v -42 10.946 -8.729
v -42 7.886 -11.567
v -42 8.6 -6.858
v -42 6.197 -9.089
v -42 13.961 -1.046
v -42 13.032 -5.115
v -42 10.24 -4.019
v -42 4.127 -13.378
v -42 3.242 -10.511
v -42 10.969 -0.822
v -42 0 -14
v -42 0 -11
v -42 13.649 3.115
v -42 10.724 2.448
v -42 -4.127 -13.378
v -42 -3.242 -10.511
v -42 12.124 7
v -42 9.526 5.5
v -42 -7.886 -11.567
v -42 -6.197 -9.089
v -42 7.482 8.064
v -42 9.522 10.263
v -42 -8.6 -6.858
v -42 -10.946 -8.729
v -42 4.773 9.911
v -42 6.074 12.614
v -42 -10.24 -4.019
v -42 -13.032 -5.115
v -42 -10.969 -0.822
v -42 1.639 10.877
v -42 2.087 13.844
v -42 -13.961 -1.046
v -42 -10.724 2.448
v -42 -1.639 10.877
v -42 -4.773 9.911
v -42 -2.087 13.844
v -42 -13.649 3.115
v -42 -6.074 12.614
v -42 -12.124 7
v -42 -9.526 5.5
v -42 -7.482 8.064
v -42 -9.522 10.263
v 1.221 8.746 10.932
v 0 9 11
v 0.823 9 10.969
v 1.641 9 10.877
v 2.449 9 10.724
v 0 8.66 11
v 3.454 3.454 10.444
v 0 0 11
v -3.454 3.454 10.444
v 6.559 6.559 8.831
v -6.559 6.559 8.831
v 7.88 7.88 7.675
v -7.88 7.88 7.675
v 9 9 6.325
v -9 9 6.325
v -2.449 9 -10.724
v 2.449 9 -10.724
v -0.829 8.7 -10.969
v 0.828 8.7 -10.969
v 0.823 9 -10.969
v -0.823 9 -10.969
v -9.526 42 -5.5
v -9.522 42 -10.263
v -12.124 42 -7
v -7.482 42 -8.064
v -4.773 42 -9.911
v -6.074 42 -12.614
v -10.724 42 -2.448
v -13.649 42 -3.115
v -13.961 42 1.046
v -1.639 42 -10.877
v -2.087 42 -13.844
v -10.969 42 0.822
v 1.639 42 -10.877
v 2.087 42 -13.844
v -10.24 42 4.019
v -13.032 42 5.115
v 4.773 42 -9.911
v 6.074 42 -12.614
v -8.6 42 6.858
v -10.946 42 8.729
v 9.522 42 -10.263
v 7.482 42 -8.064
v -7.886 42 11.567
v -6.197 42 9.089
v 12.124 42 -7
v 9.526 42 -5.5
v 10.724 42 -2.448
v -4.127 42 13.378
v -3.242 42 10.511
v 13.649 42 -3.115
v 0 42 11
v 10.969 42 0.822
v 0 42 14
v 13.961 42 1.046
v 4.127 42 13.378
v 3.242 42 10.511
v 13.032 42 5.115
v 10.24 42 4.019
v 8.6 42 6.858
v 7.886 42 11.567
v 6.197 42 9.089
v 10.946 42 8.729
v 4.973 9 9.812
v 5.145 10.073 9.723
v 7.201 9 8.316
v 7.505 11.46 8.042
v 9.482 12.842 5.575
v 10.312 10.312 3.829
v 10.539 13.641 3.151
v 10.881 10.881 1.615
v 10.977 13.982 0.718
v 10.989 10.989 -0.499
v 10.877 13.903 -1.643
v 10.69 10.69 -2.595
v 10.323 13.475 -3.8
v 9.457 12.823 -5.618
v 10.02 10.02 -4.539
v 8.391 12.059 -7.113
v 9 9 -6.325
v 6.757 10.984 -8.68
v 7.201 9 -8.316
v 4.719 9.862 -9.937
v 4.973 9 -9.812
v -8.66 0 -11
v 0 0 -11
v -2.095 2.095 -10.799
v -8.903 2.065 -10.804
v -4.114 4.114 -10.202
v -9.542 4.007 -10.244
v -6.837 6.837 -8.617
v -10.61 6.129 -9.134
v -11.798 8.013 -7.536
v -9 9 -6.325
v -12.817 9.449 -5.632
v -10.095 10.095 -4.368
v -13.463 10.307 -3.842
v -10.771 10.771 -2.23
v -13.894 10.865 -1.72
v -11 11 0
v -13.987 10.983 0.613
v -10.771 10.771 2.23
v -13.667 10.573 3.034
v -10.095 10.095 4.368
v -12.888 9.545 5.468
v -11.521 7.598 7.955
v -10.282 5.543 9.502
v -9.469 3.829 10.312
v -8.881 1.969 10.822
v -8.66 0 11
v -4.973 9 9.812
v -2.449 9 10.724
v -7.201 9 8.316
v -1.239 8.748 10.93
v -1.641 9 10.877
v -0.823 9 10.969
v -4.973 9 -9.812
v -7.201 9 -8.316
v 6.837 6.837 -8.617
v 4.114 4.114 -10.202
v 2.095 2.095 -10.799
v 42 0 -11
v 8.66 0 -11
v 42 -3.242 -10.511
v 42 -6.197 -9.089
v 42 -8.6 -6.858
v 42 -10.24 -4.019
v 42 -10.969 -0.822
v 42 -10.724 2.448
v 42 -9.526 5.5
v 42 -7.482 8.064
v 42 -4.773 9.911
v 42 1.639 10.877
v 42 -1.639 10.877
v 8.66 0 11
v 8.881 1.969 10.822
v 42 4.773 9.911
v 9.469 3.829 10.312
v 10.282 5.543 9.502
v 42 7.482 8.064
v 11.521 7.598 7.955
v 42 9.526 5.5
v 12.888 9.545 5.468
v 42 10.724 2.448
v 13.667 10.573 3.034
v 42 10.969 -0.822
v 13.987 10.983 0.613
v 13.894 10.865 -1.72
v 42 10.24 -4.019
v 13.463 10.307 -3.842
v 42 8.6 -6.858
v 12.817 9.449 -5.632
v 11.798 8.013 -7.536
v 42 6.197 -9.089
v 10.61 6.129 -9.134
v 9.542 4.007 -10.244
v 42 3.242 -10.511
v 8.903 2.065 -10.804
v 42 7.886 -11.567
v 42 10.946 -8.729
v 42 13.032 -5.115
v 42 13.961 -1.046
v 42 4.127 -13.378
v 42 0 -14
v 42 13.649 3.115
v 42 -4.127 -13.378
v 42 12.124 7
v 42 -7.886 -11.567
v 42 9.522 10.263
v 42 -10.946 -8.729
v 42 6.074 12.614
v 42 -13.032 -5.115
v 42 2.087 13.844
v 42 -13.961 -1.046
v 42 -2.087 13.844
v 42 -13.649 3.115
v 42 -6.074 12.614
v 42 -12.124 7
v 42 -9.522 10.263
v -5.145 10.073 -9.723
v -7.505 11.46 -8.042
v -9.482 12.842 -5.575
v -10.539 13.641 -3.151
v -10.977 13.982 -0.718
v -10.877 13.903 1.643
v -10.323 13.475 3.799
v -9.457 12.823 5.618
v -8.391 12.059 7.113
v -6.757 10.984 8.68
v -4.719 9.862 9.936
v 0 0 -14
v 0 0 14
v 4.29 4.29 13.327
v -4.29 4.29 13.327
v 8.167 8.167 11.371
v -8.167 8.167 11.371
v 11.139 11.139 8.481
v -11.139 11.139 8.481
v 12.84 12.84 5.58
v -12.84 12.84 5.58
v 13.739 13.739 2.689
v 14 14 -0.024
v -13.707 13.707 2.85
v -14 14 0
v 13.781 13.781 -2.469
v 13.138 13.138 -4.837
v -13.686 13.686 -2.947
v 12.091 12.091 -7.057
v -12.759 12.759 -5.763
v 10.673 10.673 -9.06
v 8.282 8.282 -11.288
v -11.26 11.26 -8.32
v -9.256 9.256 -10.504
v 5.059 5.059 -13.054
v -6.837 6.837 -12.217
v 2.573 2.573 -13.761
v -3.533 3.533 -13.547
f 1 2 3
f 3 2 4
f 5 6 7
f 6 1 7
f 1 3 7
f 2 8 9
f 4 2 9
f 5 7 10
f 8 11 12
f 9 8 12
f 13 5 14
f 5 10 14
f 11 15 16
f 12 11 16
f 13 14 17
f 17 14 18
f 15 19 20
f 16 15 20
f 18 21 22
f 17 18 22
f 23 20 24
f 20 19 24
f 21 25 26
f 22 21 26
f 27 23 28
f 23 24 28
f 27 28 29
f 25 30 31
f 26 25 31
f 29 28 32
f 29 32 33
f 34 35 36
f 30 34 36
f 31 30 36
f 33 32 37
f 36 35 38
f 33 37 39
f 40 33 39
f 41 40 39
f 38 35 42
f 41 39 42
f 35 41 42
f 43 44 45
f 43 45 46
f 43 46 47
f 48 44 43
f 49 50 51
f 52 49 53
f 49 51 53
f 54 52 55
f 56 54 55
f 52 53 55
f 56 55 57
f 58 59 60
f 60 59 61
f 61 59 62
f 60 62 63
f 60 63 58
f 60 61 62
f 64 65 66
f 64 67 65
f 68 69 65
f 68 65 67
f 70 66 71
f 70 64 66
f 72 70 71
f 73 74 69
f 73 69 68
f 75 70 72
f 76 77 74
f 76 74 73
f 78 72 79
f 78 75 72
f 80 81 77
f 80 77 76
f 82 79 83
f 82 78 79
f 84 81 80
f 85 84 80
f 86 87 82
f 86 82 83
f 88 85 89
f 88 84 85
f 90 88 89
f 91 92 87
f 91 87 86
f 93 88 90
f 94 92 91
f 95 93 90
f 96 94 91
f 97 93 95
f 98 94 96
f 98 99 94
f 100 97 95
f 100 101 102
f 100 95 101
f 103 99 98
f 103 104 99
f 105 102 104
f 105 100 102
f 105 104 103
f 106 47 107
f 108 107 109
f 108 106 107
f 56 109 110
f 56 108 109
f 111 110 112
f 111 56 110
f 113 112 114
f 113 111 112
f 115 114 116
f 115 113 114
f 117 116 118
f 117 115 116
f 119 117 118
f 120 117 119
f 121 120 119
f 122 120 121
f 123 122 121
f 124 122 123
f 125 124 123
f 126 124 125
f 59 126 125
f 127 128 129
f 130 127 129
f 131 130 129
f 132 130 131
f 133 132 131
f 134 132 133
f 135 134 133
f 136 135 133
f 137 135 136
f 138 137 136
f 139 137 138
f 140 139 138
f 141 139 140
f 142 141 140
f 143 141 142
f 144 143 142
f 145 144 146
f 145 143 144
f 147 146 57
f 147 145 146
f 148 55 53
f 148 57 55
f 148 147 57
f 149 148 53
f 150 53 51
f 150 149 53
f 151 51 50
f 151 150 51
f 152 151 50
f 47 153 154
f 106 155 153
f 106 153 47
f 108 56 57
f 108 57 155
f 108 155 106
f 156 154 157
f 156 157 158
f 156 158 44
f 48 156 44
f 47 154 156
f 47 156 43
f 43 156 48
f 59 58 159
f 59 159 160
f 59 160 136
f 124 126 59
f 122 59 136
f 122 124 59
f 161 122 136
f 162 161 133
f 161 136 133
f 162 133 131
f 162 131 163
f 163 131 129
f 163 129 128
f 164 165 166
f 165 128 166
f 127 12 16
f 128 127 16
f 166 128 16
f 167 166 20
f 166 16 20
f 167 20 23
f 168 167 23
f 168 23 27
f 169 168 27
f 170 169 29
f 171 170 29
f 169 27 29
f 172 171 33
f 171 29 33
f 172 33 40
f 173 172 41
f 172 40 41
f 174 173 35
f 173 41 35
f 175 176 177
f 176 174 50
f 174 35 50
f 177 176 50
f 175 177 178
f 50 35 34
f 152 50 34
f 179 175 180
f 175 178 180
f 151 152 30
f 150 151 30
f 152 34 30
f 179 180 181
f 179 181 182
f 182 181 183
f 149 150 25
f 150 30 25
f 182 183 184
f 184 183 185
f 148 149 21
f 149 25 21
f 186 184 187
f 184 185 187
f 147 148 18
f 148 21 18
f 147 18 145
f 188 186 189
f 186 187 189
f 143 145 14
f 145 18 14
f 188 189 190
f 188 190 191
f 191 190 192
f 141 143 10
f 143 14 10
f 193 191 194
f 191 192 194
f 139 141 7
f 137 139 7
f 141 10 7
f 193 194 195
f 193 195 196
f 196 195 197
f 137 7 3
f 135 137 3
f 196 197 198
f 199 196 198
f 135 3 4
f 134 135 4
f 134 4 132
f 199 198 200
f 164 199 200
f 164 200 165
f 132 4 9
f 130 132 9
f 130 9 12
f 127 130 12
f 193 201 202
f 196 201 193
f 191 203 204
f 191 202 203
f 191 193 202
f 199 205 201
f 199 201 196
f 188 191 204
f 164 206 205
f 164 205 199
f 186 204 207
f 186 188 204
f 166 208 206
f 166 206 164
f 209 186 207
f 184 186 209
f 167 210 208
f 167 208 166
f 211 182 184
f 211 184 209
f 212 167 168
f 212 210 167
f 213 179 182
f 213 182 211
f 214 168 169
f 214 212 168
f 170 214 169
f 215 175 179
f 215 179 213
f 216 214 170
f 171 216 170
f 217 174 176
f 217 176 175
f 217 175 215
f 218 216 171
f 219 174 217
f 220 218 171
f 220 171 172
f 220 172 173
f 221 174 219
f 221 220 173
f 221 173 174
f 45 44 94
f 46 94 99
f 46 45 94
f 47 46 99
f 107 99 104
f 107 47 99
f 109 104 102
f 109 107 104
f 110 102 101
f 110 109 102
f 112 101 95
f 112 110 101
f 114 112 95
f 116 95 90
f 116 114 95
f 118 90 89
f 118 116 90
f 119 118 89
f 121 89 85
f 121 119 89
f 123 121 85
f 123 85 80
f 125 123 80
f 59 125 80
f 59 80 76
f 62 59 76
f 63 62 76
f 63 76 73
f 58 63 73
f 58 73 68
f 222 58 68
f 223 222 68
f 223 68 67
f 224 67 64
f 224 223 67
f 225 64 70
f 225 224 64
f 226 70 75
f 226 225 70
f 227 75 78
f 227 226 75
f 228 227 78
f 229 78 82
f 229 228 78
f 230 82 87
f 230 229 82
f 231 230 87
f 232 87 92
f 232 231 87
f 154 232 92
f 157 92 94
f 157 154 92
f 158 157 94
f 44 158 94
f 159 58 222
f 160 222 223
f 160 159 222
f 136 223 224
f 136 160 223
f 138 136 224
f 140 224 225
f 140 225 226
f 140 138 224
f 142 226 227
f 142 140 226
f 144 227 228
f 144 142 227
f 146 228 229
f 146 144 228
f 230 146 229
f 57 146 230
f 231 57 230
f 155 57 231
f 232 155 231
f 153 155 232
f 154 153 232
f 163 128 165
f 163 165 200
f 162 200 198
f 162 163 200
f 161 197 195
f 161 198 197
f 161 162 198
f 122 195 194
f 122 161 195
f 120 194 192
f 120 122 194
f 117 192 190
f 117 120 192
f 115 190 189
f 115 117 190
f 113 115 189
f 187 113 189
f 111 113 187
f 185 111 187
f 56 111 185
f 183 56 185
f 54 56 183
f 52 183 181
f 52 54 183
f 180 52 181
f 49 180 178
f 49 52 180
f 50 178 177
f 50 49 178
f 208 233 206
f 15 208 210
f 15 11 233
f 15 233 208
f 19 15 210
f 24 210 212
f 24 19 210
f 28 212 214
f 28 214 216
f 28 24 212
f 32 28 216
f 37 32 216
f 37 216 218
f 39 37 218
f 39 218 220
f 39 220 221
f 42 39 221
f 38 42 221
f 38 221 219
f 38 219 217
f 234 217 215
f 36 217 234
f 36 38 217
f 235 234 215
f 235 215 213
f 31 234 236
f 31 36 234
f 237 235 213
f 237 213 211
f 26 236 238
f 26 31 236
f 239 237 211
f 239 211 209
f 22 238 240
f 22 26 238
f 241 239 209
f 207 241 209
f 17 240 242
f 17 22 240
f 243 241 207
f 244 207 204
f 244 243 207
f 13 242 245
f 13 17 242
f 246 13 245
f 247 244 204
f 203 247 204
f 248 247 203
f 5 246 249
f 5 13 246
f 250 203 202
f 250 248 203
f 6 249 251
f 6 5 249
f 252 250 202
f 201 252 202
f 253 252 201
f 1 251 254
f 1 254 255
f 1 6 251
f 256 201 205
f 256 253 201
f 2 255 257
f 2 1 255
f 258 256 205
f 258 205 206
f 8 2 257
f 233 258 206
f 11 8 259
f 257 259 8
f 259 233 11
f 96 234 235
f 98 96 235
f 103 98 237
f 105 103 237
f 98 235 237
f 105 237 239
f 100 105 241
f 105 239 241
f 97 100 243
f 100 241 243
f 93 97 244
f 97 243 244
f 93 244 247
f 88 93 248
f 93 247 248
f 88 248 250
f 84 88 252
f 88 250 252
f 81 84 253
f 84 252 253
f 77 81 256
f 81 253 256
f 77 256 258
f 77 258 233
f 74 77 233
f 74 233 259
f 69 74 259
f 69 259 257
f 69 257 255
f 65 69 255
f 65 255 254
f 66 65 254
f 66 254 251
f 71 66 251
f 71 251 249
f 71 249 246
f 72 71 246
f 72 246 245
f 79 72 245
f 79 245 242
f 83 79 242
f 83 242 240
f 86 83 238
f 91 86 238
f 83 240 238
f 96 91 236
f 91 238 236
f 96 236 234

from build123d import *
from build123d.topology import SkipClean

# Parameters (mm, degrees)
SKETCH3_R           = 14
SKETCH3_R_2         = 11
SKETCH5_R           = 14
SKETCH5_R_2         = 11
BOSS_EXTRUDE1_DEPTH = 42
CUT_EXTRUDE1_START  = -95
SKETCH6_R           = 11
CUT_EXTRUDE1_DEPTH  = 95
CUT_EXTRUDE2_START  = -33
SKETCH7_R           = 11
CUT_EXTRUDE2_DEPTH  = 33


with BuildPart() as part:
    # Sweep1: sweep along a path in Sketch1
    with BuildLine(Plane.XY) as sweep1_path:
        Line((42, 0), (0, 0))
        Line((0, 0), (-42, 0))
    # Sketch3 → Sweep1 (sweep)
    with BuildSketch(Plane(origin=(32, 0, 0), x_dir=(0, 0, -1), z_dir=(1, 0, 0))):
        Circle(SKETCH3_R)
        Circle(SKETCH3_R_2, mode=Mode.SUBTRACT)
    sweep(path=sweep1_path.line)

    # Sketch5 → Boss-Extrude1 (add)
    with BuildSketch(Plane(origin=(0, 0, 0), x_dir=(1, 0, 0), z_dir=(0, 1, 0))):
        with Locations(Location((0, 0, 0), (0, 0, 270))):
            Circle(SKETCH5_R)
        with Locations(Location((0, 0, 0), (0, 0, 270))):
            Circle(SKETCH5_R_2, mode=Mode.SUBTRACT)
    extrude(amount=BOSS_EXTRUDE1_DEPTH)

    # Sketch6 → Cut-Extrude1 (cut)
    with SkipClean():  # the faces are left unmerged after this step: merging them gives an invalid solid
        with BuildSketch(Plane(origin=(42, 0, 0), x_dir=(0, 0, -1), z_dir=(1, 0, 0)).offset(CUT_EXTRUDE1_START)):
            Circle(SKETCH6_R)
        extrude(amount=CUT_EXTRUDE1_DEPTH, mode=Mode.SUBTRACT)

    # Sketch7 → Cut-Extrude2 (cut)
    with SkipClean():  # the faces are left unmerged after this step: merging them gives an invalid solid
        with BuildSketch(Plane(origin=(0, 42, 0), x_dir=(1, 0, 0), z_dir=(0, 1, 0)).offset(CUT_EXTRUDE2_START)):
            with Locations(Location((0, 0, 0), (0, 0, 270))):
                Circle(SKETCH7_R)
        extrude(amount=CUT_EXTRUDE2_DEPTH, mode=Mode.SUBTRACT)


solid = part.part
